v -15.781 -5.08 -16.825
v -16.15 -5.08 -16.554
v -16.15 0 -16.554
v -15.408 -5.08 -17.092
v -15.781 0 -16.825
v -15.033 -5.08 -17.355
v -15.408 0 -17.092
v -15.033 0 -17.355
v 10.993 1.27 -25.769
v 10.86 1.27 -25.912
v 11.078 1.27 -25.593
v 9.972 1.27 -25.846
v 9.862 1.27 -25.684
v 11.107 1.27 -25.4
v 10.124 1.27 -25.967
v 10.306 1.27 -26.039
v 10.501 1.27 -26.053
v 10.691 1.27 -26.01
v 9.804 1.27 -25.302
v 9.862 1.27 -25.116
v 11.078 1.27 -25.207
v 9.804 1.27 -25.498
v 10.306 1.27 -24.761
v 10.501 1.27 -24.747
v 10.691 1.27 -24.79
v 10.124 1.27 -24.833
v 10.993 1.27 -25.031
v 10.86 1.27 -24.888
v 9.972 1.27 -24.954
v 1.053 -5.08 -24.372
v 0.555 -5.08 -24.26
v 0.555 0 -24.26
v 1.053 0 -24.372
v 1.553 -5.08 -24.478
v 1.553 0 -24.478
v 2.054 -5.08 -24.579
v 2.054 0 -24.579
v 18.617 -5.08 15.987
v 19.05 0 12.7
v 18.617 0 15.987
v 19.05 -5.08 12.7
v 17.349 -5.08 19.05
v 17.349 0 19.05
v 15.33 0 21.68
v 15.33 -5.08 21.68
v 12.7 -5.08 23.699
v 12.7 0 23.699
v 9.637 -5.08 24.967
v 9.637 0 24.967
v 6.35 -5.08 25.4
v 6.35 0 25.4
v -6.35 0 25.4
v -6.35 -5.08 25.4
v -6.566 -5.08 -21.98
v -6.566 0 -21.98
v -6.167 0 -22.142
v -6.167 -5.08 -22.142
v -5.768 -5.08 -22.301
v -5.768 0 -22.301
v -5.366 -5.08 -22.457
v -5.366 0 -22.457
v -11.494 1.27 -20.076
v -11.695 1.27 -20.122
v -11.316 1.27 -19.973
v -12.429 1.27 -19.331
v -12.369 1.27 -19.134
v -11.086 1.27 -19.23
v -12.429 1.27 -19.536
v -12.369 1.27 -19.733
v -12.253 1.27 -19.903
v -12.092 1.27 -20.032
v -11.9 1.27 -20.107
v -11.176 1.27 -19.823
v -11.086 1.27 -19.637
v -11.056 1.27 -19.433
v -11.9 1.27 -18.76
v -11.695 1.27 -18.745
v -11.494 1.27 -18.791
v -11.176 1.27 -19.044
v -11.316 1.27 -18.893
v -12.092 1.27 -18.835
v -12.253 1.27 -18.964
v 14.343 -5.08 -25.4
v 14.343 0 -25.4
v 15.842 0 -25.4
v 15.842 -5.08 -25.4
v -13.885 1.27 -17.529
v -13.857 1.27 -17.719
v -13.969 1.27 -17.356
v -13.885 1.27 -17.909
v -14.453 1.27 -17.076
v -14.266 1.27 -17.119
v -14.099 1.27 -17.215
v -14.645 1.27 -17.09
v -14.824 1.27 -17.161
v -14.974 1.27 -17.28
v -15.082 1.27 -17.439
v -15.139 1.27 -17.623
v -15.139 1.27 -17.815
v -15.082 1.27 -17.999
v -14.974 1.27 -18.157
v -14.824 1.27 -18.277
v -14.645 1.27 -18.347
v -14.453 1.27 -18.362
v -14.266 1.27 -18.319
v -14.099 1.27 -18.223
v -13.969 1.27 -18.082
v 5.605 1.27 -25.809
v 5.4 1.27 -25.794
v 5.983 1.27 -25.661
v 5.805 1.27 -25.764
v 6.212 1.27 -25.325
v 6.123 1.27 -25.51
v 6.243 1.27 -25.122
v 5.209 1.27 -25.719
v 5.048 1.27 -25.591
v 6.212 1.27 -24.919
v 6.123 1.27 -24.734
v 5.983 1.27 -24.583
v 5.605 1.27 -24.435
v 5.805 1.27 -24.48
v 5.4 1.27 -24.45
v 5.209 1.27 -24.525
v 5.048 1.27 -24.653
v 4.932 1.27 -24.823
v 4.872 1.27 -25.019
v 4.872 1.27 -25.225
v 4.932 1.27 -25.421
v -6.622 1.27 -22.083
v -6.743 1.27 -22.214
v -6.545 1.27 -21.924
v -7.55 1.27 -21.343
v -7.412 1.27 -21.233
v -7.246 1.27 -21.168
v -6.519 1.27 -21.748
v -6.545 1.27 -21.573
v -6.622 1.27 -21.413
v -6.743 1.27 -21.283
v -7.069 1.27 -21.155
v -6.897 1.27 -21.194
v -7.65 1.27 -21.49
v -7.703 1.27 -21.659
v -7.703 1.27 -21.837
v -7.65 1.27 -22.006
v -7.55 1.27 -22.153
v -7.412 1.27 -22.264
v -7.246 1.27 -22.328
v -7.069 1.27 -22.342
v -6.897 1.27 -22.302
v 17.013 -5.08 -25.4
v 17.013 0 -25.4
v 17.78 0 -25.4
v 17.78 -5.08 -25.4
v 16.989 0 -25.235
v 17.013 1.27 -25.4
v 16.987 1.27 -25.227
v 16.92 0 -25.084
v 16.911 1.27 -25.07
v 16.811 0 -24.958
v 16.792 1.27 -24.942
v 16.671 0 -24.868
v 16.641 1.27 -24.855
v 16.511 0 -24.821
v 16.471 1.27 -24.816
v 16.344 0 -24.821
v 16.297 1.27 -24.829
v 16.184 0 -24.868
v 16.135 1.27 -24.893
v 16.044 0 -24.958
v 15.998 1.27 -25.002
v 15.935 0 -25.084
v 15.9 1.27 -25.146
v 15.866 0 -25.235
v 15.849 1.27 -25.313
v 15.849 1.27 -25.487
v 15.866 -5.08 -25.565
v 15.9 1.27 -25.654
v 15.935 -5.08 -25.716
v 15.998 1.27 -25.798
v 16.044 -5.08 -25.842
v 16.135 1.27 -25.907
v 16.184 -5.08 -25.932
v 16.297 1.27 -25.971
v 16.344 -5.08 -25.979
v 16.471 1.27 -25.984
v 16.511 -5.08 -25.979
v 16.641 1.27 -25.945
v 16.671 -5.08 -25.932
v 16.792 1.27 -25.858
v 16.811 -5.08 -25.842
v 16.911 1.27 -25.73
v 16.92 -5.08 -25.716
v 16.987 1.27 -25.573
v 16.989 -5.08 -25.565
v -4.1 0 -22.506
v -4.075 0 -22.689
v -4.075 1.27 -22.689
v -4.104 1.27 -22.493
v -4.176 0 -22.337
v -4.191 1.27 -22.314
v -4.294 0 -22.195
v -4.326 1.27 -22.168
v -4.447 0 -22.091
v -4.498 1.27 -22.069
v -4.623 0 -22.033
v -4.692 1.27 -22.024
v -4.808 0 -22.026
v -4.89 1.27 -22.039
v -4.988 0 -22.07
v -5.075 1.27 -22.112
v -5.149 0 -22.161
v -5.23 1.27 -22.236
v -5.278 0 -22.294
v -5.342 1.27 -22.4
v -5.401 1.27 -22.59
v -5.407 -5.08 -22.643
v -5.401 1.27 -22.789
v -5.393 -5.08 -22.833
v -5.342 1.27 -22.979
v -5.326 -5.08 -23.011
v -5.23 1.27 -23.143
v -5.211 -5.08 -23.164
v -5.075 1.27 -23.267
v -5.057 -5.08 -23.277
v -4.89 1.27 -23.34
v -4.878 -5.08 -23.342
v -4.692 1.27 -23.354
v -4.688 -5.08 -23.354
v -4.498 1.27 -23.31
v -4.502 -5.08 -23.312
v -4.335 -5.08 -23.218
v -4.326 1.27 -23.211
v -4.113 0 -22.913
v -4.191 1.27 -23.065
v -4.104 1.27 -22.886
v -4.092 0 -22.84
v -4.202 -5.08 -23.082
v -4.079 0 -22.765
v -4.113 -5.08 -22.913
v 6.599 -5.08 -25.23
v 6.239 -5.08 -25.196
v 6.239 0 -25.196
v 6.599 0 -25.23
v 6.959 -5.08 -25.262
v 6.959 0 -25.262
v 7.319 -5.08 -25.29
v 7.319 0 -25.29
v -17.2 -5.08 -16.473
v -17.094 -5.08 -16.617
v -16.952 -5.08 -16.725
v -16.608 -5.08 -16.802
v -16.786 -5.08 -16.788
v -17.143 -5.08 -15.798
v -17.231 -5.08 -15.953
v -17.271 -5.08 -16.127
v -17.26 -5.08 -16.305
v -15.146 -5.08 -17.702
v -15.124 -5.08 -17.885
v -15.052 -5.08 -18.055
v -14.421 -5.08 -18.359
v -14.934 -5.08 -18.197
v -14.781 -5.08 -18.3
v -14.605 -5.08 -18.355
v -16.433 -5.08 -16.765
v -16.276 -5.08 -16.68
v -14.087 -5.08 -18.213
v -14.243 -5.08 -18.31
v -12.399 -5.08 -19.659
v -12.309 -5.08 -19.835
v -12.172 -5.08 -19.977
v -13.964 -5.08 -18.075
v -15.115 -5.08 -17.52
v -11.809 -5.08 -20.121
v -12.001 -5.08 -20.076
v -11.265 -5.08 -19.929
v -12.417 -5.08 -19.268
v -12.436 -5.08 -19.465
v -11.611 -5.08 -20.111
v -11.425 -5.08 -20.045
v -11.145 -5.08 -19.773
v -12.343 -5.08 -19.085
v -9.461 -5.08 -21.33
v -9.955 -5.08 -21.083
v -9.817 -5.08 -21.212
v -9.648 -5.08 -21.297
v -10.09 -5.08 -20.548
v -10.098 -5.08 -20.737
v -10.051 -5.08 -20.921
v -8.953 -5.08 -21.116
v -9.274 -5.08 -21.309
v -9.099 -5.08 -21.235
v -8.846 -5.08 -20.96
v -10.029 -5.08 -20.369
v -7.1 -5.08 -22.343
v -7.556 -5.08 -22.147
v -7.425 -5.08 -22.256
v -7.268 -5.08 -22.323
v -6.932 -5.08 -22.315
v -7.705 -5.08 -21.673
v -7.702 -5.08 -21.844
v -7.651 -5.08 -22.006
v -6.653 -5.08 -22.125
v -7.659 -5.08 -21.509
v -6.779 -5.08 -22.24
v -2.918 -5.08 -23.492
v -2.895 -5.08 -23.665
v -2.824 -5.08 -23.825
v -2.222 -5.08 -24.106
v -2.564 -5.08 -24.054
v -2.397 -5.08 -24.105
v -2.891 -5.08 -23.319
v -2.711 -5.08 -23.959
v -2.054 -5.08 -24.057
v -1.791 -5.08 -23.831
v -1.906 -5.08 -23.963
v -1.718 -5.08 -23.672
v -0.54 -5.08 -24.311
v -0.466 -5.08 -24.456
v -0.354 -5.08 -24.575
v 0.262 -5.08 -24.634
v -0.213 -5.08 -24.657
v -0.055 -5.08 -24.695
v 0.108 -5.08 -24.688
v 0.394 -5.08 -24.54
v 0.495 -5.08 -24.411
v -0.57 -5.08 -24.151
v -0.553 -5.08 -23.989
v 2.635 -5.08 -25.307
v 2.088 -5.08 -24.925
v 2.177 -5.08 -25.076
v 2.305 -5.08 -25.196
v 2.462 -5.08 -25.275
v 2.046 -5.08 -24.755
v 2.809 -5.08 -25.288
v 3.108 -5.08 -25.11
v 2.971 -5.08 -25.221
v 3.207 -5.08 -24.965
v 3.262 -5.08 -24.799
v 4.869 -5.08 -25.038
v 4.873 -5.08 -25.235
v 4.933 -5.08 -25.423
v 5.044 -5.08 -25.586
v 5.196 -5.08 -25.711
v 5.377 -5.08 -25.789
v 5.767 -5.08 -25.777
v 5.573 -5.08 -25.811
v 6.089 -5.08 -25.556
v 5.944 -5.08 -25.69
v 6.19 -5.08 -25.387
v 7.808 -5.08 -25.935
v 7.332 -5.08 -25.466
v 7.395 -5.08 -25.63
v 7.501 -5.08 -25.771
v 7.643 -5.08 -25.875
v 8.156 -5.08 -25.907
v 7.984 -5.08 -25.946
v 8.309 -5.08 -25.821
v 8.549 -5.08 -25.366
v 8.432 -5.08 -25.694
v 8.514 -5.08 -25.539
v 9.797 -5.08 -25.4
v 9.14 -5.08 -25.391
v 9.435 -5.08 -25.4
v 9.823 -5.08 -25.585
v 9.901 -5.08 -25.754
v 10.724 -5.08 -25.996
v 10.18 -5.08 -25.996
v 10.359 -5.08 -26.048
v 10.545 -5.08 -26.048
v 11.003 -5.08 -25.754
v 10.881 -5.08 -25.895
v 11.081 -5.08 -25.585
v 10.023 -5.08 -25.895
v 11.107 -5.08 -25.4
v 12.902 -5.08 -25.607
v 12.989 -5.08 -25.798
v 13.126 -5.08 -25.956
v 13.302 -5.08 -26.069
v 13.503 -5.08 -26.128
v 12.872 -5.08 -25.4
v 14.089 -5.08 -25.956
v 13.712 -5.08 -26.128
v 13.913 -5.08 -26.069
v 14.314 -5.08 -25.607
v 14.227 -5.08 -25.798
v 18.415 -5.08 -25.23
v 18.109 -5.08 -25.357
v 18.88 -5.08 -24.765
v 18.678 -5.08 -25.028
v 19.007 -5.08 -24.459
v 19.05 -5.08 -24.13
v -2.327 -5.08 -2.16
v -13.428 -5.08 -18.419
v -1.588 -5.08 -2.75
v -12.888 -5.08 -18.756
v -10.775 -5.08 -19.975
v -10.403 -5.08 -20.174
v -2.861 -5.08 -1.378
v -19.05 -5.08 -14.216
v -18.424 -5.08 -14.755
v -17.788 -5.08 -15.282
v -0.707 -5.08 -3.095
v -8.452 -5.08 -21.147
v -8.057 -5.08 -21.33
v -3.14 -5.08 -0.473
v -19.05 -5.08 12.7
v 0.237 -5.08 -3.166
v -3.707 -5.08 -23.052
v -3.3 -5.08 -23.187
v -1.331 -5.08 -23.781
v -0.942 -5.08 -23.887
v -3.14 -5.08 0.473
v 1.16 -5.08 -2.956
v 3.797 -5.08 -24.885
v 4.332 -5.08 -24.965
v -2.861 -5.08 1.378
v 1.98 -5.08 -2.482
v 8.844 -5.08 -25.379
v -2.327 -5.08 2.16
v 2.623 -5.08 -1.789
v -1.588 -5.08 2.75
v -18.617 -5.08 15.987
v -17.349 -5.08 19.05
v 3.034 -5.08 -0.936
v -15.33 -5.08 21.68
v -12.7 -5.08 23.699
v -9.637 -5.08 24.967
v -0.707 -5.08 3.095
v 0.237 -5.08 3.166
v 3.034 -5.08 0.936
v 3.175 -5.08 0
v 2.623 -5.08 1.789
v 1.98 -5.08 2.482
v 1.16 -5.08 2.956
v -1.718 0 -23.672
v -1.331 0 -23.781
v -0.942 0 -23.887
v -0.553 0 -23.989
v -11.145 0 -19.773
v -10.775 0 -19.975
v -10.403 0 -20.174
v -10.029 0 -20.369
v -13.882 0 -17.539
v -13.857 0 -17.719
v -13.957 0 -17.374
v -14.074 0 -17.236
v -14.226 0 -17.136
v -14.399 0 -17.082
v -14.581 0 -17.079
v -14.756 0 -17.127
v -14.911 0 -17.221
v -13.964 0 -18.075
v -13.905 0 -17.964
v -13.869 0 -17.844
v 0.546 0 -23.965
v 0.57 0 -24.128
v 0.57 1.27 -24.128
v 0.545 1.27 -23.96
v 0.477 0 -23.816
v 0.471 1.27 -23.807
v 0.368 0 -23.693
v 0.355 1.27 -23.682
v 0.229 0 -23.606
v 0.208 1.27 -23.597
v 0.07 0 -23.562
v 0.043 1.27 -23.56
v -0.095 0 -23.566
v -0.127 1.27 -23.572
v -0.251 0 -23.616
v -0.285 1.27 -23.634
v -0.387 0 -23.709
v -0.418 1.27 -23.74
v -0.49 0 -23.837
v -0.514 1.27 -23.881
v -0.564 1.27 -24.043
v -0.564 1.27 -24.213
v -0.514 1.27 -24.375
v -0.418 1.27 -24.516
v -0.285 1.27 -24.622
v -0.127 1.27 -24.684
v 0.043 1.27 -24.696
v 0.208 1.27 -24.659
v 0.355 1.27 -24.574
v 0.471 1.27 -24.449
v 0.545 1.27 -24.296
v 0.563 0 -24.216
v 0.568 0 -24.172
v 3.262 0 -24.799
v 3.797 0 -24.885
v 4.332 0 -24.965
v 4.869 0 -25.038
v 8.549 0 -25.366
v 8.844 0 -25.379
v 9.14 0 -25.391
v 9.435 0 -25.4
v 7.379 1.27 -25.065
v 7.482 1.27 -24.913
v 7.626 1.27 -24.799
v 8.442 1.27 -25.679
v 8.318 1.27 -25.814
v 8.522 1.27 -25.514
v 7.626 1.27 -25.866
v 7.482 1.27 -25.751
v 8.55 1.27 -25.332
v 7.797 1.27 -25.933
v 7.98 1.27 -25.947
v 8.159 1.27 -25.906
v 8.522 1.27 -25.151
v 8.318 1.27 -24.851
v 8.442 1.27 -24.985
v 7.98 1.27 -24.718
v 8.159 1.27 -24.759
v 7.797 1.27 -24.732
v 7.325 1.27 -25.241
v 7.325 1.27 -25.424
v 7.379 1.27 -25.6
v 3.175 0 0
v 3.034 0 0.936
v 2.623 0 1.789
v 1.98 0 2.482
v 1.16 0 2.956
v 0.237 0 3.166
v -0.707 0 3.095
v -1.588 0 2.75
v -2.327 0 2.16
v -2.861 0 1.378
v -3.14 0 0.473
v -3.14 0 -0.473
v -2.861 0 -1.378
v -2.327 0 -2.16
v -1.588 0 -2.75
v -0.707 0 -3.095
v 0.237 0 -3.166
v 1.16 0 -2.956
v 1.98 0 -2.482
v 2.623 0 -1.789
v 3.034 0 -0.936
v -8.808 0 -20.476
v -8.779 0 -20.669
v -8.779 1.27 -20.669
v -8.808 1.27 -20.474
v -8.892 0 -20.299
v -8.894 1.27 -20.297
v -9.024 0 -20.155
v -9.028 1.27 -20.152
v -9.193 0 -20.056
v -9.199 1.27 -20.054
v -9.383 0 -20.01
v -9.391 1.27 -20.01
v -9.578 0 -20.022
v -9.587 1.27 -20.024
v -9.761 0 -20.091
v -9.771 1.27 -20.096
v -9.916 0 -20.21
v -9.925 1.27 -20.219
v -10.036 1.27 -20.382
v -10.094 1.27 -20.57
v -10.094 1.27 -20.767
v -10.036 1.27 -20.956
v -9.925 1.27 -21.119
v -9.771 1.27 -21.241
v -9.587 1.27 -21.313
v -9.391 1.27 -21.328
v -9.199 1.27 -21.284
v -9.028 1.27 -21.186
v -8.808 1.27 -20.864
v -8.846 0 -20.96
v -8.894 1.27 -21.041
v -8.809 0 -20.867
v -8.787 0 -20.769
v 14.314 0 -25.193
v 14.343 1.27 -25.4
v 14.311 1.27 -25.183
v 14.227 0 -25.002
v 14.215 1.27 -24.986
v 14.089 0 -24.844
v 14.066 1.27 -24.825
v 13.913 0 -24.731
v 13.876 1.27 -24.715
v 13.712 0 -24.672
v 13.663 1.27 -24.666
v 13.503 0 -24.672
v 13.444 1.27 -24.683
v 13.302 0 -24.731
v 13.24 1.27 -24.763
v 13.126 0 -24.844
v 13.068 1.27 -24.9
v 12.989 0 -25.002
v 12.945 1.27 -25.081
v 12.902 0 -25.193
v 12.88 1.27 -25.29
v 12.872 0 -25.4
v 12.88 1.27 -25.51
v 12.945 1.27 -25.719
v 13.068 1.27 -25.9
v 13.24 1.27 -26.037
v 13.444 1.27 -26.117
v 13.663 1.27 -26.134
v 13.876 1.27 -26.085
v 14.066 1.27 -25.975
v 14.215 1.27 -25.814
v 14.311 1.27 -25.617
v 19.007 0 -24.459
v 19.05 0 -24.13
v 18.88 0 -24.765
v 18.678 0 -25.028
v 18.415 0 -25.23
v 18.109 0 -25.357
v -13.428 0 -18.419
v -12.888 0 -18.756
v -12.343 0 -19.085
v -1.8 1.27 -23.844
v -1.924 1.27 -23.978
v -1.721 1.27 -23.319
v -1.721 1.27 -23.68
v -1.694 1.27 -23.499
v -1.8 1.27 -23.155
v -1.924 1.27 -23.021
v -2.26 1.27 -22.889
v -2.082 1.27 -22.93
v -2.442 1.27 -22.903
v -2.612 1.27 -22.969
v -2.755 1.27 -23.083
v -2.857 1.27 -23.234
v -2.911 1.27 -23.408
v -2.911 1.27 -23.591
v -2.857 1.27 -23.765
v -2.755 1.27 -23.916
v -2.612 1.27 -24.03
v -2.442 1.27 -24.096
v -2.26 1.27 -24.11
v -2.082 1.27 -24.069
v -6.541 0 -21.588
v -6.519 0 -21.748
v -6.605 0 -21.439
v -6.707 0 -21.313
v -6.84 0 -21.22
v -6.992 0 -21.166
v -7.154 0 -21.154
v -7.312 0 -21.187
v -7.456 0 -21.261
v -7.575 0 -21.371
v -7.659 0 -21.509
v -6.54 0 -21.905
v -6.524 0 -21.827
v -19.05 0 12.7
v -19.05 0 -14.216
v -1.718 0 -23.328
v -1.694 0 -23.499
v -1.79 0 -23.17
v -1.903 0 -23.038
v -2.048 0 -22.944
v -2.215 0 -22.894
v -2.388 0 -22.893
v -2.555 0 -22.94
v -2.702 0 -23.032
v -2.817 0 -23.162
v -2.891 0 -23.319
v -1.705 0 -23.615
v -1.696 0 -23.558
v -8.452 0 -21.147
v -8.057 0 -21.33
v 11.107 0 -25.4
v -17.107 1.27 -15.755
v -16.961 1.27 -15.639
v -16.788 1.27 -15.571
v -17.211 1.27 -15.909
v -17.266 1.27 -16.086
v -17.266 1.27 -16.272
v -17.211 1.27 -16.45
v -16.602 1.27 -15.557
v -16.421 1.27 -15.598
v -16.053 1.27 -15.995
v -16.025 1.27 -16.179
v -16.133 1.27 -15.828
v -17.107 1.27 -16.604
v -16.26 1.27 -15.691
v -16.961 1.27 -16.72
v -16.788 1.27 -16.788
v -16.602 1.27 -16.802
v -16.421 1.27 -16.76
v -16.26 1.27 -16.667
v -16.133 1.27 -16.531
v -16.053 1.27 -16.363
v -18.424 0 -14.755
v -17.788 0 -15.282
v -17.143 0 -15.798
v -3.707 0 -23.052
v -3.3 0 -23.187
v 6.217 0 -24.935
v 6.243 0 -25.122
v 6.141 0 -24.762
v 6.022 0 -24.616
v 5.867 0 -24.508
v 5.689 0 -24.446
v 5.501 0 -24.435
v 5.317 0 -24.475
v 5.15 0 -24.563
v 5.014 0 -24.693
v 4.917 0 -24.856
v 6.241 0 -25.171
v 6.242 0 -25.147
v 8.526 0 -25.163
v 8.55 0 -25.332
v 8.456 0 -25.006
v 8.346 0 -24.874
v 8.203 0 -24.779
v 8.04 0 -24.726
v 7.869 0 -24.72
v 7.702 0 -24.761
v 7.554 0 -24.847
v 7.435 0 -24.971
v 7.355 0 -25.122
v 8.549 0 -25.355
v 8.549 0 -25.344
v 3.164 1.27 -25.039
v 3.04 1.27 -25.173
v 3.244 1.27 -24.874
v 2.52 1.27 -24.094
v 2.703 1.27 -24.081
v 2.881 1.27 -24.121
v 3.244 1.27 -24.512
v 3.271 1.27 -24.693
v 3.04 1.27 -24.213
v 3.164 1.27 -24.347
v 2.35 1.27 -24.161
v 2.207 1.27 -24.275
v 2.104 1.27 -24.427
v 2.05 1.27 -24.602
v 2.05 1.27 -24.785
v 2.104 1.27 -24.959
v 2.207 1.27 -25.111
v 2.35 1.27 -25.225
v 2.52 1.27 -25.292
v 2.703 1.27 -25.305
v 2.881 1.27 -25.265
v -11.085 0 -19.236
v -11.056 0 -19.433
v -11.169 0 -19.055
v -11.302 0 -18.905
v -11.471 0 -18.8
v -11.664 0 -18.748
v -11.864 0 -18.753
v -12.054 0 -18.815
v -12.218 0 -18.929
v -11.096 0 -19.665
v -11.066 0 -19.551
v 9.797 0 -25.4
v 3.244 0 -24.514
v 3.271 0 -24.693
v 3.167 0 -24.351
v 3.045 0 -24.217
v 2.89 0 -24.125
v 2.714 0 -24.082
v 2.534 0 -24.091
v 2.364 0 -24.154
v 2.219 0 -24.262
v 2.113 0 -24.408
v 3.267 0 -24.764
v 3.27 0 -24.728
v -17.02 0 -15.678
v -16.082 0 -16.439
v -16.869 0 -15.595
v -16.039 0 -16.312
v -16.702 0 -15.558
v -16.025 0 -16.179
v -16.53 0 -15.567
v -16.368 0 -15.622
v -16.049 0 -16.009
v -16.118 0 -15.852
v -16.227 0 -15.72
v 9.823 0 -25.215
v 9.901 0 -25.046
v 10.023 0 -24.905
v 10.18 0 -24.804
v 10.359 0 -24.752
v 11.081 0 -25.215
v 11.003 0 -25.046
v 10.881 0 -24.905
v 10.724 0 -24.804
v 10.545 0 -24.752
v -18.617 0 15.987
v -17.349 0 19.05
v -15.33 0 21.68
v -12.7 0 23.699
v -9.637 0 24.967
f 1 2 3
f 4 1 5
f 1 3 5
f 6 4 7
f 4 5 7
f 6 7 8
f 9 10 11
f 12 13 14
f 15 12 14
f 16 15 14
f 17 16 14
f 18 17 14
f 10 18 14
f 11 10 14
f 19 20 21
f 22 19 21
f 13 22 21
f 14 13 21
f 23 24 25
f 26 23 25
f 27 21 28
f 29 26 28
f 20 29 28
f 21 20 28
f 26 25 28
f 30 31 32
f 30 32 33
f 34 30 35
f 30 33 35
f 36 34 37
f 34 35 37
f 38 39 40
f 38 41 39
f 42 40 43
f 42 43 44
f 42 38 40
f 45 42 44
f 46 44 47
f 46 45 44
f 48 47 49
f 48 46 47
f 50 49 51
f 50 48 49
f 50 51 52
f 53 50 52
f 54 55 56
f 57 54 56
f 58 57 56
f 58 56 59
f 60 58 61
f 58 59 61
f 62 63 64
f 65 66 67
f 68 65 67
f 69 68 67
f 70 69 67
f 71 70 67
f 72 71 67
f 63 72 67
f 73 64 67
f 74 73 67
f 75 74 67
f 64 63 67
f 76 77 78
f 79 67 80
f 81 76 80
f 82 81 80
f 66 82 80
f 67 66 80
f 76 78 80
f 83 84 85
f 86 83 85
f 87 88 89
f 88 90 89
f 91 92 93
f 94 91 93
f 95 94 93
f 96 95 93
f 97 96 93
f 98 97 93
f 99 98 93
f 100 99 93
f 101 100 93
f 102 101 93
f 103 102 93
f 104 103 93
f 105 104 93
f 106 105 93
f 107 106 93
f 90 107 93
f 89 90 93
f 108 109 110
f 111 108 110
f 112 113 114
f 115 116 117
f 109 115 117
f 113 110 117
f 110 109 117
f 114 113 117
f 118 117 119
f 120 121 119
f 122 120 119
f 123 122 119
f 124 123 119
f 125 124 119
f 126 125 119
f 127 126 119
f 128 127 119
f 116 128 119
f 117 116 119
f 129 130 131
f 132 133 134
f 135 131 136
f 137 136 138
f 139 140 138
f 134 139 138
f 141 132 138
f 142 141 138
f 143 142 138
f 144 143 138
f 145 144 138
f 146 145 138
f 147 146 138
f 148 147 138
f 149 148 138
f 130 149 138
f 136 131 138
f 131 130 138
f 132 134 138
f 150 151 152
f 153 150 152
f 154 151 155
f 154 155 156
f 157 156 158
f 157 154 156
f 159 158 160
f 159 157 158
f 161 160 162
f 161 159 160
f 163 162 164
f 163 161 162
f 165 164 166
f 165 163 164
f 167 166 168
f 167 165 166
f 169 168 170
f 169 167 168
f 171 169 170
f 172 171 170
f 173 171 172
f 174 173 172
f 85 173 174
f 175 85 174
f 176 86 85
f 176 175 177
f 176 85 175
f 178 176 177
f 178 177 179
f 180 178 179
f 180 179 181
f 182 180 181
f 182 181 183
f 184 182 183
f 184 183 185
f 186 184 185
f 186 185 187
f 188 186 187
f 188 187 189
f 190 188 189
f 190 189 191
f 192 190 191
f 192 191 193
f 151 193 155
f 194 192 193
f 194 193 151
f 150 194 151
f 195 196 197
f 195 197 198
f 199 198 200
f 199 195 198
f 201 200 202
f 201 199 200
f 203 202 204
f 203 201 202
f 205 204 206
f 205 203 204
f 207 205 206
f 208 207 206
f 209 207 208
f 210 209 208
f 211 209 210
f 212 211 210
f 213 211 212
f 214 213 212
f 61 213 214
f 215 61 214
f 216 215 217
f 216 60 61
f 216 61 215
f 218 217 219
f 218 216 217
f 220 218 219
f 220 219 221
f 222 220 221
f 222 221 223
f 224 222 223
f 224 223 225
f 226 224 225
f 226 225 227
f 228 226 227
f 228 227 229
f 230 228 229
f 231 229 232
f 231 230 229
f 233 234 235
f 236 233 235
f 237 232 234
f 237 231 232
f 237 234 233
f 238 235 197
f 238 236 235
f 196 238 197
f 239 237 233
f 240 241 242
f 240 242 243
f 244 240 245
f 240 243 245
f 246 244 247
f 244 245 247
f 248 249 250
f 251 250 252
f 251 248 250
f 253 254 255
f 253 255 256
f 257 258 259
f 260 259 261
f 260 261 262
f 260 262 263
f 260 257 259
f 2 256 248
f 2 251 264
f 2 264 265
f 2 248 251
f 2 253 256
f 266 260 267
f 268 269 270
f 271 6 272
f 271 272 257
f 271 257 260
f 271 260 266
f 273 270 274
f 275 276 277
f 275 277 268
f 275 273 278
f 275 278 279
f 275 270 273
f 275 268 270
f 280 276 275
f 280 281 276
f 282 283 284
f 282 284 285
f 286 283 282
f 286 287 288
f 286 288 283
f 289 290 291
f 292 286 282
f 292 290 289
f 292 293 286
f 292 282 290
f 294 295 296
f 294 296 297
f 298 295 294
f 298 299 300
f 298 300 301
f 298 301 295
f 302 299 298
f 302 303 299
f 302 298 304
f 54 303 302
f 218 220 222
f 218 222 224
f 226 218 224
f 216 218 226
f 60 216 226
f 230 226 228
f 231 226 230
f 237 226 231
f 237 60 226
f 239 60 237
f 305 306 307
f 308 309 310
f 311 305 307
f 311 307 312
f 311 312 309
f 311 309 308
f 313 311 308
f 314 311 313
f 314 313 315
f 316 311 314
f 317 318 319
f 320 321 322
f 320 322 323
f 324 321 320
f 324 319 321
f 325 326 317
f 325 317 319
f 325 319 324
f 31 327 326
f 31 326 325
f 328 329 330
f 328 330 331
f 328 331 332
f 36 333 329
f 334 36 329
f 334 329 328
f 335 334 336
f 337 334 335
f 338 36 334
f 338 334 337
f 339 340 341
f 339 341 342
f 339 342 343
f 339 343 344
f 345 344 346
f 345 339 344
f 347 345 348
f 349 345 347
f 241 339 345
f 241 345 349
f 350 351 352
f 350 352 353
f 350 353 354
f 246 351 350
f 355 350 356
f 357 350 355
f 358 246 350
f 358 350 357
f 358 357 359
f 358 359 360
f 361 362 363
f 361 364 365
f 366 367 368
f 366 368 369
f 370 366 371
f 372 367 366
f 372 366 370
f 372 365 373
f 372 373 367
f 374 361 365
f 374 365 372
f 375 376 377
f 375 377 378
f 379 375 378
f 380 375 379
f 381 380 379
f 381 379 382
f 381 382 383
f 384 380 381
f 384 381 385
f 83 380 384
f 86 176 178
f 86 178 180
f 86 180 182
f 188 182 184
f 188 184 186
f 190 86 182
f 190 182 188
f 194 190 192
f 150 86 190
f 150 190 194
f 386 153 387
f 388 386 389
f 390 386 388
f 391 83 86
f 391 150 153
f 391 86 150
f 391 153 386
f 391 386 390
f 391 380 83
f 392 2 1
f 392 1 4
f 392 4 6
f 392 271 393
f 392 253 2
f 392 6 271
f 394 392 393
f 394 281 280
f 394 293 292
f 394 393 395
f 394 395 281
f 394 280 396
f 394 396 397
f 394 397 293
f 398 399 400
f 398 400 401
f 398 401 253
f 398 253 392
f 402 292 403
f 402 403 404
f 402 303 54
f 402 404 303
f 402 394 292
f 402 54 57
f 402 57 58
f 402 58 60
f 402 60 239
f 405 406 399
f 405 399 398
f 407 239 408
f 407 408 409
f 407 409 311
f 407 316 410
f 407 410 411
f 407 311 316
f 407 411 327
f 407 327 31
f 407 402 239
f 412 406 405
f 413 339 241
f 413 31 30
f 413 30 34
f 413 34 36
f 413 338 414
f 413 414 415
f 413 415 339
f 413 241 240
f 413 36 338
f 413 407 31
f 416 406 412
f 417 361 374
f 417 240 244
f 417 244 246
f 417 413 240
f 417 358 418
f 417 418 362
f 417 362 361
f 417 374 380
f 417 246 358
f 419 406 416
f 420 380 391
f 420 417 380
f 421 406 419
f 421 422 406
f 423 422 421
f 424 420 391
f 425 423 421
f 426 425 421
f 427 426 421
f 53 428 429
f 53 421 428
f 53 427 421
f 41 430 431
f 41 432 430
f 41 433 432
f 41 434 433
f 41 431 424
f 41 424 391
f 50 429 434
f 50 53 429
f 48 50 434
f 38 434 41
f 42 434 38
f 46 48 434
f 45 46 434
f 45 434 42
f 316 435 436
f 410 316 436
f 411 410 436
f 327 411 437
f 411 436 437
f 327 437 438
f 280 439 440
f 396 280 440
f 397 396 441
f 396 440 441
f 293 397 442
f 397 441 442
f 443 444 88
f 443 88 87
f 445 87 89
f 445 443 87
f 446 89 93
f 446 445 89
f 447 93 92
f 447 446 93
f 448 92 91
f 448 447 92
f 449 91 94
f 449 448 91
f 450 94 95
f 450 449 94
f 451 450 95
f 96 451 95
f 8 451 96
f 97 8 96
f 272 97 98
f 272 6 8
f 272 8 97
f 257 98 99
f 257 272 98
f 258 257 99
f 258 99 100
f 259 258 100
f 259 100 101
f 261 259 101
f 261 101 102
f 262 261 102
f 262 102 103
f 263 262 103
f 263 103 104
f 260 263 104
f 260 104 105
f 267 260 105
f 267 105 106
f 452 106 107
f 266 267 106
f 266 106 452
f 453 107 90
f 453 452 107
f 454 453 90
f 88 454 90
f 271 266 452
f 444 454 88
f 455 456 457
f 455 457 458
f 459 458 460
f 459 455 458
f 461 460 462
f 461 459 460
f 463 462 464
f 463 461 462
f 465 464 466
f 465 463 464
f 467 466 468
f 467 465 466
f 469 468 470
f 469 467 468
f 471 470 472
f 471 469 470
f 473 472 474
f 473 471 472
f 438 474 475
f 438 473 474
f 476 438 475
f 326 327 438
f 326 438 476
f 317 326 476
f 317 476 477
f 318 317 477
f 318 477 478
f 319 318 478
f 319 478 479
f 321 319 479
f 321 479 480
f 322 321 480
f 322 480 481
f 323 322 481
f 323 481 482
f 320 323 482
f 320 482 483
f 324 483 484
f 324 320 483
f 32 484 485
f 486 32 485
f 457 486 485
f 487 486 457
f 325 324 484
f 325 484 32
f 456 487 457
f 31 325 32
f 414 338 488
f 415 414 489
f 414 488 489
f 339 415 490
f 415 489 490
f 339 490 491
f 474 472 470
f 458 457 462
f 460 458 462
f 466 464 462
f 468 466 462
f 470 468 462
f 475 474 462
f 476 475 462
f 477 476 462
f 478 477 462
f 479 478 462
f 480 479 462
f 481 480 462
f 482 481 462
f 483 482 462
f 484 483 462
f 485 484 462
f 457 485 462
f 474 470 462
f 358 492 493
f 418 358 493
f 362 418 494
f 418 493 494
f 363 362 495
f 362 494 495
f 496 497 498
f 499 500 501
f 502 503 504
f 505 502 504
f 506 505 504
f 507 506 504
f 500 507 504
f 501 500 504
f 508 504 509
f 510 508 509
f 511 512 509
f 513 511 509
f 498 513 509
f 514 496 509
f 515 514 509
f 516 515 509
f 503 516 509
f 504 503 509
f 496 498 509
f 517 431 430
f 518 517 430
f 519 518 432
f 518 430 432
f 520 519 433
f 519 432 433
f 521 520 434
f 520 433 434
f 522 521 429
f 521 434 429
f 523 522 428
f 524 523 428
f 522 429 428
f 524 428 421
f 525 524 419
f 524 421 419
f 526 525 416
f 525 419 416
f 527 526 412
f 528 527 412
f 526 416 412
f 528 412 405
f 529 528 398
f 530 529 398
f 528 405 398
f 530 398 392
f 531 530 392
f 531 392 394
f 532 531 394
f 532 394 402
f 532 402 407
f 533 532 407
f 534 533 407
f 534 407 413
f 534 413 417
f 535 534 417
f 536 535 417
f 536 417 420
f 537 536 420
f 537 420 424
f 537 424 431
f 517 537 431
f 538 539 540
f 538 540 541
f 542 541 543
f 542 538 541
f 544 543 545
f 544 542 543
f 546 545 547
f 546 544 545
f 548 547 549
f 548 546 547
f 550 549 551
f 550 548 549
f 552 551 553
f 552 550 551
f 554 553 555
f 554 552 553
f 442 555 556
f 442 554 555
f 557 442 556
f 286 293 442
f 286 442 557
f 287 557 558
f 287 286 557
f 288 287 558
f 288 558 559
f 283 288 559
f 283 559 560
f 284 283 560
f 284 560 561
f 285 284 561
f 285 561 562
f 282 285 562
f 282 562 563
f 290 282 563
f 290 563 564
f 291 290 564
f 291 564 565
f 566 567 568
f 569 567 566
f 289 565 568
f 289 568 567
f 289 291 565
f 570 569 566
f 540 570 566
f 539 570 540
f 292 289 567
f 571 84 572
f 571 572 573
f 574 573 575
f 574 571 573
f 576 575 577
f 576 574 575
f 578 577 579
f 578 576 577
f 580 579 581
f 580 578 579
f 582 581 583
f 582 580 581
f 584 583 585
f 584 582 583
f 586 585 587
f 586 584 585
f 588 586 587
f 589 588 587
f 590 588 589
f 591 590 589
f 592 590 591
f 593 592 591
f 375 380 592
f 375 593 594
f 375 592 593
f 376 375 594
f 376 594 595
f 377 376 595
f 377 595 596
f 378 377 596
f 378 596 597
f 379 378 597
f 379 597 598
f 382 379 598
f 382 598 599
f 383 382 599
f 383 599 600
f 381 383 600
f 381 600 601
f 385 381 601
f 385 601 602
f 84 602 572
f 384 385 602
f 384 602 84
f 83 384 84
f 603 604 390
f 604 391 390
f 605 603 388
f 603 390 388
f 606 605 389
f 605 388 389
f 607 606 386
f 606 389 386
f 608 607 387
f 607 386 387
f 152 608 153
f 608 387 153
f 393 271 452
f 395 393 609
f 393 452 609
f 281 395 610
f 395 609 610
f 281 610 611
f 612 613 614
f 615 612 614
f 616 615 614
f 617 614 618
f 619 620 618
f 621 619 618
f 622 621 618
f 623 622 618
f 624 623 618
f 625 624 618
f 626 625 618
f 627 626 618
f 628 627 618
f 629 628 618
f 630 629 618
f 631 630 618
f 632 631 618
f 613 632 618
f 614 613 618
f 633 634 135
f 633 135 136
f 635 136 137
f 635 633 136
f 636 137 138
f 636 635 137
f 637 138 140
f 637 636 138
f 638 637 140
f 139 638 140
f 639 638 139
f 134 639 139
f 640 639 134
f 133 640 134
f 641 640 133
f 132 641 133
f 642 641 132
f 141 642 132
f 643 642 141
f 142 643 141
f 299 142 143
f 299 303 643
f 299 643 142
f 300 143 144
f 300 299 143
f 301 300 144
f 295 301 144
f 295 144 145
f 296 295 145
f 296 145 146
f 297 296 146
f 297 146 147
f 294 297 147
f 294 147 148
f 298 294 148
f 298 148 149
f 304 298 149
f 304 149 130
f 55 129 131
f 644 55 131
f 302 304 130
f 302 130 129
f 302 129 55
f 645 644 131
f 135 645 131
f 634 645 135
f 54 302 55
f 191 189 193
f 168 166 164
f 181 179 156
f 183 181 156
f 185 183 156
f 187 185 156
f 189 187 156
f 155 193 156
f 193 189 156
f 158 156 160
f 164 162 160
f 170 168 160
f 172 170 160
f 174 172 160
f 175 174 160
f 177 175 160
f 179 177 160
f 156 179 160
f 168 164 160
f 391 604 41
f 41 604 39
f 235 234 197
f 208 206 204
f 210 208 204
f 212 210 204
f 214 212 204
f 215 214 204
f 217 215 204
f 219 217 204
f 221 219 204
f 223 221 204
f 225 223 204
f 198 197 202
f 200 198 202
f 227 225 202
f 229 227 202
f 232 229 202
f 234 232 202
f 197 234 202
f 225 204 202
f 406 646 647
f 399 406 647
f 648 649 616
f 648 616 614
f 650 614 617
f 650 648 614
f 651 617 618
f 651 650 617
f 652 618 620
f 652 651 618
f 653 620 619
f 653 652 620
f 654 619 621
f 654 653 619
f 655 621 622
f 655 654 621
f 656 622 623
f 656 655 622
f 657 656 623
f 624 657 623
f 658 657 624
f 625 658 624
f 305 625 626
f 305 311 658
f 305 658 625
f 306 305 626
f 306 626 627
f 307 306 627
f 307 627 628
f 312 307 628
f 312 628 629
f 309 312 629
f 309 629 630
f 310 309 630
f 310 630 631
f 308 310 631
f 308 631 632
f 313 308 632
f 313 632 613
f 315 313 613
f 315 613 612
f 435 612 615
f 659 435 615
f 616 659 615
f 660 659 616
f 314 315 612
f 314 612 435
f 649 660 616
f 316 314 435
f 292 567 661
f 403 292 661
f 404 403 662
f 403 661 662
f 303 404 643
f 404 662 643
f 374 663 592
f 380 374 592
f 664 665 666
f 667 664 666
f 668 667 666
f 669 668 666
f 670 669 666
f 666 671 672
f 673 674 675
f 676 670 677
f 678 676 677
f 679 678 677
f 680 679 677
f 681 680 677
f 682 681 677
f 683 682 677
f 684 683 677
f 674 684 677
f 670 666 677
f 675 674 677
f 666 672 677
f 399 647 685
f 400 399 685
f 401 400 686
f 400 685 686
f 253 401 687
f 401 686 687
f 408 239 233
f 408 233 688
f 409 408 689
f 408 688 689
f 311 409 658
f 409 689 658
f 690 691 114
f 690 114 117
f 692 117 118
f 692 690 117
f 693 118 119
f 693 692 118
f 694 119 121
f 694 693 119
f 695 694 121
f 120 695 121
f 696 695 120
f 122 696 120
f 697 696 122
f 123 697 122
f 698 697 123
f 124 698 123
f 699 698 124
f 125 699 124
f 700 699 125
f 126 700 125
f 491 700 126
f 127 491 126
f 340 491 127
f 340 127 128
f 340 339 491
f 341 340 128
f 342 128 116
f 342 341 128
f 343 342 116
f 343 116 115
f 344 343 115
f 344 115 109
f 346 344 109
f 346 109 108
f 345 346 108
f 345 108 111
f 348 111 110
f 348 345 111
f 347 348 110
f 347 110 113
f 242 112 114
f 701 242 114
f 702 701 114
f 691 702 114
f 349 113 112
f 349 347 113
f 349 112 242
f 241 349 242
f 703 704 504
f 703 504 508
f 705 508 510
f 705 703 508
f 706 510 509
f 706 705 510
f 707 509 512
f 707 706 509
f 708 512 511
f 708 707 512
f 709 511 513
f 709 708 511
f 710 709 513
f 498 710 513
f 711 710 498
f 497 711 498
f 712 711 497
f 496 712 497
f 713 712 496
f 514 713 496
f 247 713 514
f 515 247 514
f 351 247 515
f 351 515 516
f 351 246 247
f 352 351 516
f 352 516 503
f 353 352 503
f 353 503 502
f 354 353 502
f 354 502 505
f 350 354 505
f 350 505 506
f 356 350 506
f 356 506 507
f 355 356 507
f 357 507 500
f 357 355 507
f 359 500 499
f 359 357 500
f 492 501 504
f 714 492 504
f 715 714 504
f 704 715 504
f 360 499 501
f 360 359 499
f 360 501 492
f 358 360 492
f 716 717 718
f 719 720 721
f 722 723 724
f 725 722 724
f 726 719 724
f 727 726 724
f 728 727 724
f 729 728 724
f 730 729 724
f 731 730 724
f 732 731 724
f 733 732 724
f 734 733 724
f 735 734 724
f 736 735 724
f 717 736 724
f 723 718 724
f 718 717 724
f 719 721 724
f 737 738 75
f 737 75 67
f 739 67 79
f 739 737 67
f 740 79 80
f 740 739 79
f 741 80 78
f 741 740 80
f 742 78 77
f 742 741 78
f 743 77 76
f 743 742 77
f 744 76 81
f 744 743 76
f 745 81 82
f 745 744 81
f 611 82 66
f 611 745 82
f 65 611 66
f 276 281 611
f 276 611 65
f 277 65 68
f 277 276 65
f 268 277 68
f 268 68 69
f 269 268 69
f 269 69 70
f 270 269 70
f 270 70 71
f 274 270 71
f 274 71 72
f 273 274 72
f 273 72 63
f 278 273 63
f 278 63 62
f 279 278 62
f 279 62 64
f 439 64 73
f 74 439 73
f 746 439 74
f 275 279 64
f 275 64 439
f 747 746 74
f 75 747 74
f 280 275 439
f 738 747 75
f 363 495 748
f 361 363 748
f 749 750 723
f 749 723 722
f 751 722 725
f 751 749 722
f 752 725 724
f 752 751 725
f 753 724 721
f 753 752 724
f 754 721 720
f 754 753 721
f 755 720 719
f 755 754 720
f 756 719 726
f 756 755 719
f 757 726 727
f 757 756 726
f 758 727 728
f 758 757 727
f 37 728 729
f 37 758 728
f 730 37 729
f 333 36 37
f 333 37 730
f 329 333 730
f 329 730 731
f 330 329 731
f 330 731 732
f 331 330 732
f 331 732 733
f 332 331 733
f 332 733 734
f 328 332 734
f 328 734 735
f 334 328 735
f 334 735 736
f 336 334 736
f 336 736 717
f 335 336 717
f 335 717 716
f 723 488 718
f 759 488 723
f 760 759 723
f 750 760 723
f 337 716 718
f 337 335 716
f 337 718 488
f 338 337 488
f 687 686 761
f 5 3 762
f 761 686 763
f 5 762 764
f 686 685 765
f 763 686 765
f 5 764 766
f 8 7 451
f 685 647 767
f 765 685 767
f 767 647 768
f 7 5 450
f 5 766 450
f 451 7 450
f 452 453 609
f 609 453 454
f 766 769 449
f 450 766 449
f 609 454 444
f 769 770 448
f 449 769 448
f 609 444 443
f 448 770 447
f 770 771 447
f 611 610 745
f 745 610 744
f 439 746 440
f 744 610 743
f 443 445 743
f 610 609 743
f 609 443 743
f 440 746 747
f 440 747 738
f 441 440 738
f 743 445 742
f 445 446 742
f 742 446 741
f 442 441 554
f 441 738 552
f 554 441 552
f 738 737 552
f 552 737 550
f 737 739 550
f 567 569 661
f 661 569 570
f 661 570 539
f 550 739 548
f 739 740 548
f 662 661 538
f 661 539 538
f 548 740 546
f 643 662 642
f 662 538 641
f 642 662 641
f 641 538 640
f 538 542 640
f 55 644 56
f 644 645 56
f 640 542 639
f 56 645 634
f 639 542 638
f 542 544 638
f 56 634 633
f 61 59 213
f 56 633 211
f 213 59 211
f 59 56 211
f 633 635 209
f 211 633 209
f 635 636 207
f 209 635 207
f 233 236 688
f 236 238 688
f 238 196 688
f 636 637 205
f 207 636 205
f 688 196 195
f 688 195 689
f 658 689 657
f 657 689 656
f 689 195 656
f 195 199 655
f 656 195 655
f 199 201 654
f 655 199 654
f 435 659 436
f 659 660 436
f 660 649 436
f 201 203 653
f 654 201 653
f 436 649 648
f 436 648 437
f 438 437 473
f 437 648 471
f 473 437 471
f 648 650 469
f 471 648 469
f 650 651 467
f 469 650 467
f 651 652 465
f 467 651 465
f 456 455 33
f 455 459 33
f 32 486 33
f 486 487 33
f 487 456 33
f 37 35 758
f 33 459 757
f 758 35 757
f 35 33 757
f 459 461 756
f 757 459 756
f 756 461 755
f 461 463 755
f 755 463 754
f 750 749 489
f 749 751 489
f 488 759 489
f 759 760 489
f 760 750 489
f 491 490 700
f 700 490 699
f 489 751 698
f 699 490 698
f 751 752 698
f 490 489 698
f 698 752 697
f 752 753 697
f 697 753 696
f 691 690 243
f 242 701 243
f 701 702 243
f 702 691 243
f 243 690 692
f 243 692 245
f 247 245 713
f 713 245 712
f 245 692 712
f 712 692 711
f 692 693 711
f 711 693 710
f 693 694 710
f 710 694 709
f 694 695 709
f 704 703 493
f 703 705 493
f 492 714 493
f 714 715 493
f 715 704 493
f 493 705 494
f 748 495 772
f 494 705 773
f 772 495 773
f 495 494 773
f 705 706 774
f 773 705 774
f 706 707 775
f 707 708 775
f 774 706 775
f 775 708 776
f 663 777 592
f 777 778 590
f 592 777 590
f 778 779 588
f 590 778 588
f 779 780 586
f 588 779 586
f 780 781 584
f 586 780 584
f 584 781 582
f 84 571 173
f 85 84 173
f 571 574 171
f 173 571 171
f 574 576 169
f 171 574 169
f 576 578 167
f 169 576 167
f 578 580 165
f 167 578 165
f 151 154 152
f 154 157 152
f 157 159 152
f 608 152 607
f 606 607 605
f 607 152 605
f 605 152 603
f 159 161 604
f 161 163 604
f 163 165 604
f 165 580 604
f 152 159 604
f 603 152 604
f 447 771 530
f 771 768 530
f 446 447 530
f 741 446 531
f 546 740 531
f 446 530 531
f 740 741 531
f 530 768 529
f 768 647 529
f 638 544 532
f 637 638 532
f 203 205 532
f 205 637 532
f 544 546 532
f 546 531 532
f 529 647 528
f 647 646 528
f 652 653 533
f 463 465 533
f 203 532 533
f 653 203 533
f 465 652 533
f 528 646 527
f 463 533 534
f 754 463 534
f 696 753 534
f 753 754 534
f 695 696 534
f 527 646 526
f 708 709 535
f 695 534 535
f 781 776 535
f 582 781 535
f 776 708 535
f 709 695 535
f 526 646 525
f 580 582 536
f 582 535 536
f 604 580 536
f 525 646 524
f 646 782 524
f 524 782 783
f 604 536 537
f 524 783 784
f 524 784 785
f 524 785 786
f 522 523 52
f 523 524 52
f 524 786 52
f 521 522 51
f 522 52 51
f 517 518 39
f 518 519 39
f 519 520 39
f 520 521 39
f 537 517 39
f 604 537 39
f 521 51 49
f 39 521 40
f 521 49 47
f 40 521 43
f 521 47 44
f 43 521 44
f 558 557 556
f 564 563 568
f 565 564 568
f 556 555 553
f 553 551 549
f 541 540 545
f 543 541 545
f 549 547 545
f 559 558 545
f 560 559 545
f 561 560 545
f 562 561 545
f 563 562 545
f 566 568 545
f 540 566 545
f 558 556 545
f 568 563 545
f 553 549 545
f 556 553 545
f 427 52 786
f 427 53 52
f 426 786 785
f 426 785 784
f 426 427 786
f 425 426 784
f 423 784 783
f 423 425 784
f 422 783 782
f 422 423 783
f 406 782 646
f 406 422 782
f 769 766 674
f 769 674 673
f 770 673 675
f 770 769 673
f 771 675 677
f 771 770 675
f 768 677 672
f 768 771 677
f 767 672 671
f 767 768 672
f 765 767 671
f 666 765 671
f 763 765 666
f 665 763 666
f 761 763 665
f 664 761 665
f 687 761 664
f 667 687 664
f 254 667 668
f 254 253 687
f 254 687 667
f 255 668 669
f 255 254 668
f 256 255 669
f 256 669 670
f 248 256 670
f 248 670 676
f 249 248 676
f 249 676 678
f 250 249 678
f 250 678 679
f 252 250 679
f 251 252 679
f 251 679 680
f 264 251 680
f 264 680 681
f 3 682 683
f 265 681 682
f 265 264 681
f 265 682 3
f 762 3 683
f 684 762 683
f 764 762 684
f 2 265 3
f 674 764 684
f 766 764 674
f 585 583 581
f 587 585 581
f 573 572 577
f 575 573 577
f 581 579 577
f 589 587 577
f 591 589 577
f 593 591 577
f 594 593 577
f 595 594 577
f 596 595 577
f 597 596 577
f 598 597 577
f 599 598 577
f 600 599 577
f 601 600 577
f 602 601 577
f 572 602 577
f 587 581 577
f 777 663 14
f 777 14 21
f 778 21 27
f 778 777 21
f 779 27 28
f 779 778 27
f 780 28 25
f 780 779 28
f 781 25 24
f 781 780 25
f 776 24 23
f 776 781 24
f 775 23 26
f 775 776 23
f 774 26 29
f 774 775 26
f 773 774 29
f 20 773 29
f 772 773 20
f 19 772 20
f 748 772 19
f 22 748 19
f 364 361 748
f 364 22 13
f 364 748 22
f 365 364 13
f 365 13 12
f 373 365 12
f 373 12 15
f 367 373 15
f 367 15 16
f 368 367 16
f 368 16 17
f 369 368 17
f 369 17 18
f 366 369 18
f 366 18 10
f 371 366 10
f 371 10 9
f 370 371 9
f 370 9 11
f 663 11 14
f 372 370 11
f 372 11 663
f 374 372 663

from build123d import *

# Parameters (mm, degrees)
F1_DEPTH = 5.08
F2_R     = 3.175
F3_DEPTH = 25.4
F4_R     = 12.7
F5_R     = 1.27
F6_R     = 0.624085
F6_R_2   = 0.644675
F6_R_3   = 0.690693
F6_R_4   = 0.661099
F6_R_5   = 0.595245
F6_R_6   = 0.666861
F6_R_7   = 0.612219
F6_R_8   = 0.570033
F6_R_9   = 0.614095
F6_R_10  = 0.689377
F6_R_11  = 0.615925
F6_R_12  = 0.655138
F6_R_13  = 0.735757
F6_R_14  = 0.585279
F7_DEPTH = 6.35


with BuildPart() as f1:
    # F0 (on Front) → F1 (new body)
    with BuildSketch(Plane.XZ):
        with BuildLine():
            Line((19.05, -25.4), (19.05, 25.4))
            Line((19.05, 25.4), (-19.05, 25.4))
            Line((-19.05, 25.4), (-19.05, -14.215613))
            ThreePointArc((-19.05, -14.215613), (-5.783979, -22.294952), (9.435144, -25.4))
            Line((9.435144, -25.4), (19.05, -25.4))
        make_face()
    extrude(amount=F1_DEPTH)

    # F2 (on face) → F3 (cut)
    with BuildSketch(Plane.XZ.offset(5.08)):
        Circle(F2_R)
    extrude(amount=-F3_DEPTH, mode=Mode.SUBTRACT)

    # F4
    f4_edges = [f1.edges().sort_by_distance(p)[0] for p in [
        (19.05, -2.54, 25.4),
        (-19.05, -2.54, 25.4),
    ]]
    fillet(f4_edges, radius=F4_R)

    # F5
    f5_edges = [f1.edges().sort_by_distance(p)[0] for p in [
        (19.05, -2.54, -25.4),
    ]]
    fillet(f5_edges, radius=F5_R)

    # F6 (on face) → F7 (join)
    with BuildSketch(Plane.XZ.offset(5.08)):
        with Locations((-16.64902, -16.17935)):
            Circle(F6_R)
        with Locations((-14.501234, -17.718923)):
            Circle(F6_R_2)
        with Locations((-11.7464, -19.433464)):
            Circle(F6_R_3)
        with Locations((-9.440057, -20.668933)):
            Circle(F6_R_4)
        with Locations((-7.113972, -21.748141)):
            Circle(F6_R_5)
        with Locations((-4.741597, -22.689453)):
            Circle(F6_R_6)
        with Locations((-2.305846, -23.499407)):
            Circle(F6_R_7)
        with Locations((0, -24.127949)):
            Circle(F6_R_8)
        with Locations((2.657019, -24.693049)):
            Circle(F6_R_9)
        with Locations((5.553329, -25.122012)):
            Circle(F6_R_10)
        with Locations((7.93359, -25.332349)):
            Circle(F6_R_11)
        with Locations((10.451948, -25.4)):
            Circle(F6_R_12)
        with Locations((13.607572, -25.4)):
            Circle(F6_R_13)
        with Locations((16.427536, -25.4)):
            Circle(F6_R_14)
    extrude(amount=-F7_DEPTH)


solid = f1.part
